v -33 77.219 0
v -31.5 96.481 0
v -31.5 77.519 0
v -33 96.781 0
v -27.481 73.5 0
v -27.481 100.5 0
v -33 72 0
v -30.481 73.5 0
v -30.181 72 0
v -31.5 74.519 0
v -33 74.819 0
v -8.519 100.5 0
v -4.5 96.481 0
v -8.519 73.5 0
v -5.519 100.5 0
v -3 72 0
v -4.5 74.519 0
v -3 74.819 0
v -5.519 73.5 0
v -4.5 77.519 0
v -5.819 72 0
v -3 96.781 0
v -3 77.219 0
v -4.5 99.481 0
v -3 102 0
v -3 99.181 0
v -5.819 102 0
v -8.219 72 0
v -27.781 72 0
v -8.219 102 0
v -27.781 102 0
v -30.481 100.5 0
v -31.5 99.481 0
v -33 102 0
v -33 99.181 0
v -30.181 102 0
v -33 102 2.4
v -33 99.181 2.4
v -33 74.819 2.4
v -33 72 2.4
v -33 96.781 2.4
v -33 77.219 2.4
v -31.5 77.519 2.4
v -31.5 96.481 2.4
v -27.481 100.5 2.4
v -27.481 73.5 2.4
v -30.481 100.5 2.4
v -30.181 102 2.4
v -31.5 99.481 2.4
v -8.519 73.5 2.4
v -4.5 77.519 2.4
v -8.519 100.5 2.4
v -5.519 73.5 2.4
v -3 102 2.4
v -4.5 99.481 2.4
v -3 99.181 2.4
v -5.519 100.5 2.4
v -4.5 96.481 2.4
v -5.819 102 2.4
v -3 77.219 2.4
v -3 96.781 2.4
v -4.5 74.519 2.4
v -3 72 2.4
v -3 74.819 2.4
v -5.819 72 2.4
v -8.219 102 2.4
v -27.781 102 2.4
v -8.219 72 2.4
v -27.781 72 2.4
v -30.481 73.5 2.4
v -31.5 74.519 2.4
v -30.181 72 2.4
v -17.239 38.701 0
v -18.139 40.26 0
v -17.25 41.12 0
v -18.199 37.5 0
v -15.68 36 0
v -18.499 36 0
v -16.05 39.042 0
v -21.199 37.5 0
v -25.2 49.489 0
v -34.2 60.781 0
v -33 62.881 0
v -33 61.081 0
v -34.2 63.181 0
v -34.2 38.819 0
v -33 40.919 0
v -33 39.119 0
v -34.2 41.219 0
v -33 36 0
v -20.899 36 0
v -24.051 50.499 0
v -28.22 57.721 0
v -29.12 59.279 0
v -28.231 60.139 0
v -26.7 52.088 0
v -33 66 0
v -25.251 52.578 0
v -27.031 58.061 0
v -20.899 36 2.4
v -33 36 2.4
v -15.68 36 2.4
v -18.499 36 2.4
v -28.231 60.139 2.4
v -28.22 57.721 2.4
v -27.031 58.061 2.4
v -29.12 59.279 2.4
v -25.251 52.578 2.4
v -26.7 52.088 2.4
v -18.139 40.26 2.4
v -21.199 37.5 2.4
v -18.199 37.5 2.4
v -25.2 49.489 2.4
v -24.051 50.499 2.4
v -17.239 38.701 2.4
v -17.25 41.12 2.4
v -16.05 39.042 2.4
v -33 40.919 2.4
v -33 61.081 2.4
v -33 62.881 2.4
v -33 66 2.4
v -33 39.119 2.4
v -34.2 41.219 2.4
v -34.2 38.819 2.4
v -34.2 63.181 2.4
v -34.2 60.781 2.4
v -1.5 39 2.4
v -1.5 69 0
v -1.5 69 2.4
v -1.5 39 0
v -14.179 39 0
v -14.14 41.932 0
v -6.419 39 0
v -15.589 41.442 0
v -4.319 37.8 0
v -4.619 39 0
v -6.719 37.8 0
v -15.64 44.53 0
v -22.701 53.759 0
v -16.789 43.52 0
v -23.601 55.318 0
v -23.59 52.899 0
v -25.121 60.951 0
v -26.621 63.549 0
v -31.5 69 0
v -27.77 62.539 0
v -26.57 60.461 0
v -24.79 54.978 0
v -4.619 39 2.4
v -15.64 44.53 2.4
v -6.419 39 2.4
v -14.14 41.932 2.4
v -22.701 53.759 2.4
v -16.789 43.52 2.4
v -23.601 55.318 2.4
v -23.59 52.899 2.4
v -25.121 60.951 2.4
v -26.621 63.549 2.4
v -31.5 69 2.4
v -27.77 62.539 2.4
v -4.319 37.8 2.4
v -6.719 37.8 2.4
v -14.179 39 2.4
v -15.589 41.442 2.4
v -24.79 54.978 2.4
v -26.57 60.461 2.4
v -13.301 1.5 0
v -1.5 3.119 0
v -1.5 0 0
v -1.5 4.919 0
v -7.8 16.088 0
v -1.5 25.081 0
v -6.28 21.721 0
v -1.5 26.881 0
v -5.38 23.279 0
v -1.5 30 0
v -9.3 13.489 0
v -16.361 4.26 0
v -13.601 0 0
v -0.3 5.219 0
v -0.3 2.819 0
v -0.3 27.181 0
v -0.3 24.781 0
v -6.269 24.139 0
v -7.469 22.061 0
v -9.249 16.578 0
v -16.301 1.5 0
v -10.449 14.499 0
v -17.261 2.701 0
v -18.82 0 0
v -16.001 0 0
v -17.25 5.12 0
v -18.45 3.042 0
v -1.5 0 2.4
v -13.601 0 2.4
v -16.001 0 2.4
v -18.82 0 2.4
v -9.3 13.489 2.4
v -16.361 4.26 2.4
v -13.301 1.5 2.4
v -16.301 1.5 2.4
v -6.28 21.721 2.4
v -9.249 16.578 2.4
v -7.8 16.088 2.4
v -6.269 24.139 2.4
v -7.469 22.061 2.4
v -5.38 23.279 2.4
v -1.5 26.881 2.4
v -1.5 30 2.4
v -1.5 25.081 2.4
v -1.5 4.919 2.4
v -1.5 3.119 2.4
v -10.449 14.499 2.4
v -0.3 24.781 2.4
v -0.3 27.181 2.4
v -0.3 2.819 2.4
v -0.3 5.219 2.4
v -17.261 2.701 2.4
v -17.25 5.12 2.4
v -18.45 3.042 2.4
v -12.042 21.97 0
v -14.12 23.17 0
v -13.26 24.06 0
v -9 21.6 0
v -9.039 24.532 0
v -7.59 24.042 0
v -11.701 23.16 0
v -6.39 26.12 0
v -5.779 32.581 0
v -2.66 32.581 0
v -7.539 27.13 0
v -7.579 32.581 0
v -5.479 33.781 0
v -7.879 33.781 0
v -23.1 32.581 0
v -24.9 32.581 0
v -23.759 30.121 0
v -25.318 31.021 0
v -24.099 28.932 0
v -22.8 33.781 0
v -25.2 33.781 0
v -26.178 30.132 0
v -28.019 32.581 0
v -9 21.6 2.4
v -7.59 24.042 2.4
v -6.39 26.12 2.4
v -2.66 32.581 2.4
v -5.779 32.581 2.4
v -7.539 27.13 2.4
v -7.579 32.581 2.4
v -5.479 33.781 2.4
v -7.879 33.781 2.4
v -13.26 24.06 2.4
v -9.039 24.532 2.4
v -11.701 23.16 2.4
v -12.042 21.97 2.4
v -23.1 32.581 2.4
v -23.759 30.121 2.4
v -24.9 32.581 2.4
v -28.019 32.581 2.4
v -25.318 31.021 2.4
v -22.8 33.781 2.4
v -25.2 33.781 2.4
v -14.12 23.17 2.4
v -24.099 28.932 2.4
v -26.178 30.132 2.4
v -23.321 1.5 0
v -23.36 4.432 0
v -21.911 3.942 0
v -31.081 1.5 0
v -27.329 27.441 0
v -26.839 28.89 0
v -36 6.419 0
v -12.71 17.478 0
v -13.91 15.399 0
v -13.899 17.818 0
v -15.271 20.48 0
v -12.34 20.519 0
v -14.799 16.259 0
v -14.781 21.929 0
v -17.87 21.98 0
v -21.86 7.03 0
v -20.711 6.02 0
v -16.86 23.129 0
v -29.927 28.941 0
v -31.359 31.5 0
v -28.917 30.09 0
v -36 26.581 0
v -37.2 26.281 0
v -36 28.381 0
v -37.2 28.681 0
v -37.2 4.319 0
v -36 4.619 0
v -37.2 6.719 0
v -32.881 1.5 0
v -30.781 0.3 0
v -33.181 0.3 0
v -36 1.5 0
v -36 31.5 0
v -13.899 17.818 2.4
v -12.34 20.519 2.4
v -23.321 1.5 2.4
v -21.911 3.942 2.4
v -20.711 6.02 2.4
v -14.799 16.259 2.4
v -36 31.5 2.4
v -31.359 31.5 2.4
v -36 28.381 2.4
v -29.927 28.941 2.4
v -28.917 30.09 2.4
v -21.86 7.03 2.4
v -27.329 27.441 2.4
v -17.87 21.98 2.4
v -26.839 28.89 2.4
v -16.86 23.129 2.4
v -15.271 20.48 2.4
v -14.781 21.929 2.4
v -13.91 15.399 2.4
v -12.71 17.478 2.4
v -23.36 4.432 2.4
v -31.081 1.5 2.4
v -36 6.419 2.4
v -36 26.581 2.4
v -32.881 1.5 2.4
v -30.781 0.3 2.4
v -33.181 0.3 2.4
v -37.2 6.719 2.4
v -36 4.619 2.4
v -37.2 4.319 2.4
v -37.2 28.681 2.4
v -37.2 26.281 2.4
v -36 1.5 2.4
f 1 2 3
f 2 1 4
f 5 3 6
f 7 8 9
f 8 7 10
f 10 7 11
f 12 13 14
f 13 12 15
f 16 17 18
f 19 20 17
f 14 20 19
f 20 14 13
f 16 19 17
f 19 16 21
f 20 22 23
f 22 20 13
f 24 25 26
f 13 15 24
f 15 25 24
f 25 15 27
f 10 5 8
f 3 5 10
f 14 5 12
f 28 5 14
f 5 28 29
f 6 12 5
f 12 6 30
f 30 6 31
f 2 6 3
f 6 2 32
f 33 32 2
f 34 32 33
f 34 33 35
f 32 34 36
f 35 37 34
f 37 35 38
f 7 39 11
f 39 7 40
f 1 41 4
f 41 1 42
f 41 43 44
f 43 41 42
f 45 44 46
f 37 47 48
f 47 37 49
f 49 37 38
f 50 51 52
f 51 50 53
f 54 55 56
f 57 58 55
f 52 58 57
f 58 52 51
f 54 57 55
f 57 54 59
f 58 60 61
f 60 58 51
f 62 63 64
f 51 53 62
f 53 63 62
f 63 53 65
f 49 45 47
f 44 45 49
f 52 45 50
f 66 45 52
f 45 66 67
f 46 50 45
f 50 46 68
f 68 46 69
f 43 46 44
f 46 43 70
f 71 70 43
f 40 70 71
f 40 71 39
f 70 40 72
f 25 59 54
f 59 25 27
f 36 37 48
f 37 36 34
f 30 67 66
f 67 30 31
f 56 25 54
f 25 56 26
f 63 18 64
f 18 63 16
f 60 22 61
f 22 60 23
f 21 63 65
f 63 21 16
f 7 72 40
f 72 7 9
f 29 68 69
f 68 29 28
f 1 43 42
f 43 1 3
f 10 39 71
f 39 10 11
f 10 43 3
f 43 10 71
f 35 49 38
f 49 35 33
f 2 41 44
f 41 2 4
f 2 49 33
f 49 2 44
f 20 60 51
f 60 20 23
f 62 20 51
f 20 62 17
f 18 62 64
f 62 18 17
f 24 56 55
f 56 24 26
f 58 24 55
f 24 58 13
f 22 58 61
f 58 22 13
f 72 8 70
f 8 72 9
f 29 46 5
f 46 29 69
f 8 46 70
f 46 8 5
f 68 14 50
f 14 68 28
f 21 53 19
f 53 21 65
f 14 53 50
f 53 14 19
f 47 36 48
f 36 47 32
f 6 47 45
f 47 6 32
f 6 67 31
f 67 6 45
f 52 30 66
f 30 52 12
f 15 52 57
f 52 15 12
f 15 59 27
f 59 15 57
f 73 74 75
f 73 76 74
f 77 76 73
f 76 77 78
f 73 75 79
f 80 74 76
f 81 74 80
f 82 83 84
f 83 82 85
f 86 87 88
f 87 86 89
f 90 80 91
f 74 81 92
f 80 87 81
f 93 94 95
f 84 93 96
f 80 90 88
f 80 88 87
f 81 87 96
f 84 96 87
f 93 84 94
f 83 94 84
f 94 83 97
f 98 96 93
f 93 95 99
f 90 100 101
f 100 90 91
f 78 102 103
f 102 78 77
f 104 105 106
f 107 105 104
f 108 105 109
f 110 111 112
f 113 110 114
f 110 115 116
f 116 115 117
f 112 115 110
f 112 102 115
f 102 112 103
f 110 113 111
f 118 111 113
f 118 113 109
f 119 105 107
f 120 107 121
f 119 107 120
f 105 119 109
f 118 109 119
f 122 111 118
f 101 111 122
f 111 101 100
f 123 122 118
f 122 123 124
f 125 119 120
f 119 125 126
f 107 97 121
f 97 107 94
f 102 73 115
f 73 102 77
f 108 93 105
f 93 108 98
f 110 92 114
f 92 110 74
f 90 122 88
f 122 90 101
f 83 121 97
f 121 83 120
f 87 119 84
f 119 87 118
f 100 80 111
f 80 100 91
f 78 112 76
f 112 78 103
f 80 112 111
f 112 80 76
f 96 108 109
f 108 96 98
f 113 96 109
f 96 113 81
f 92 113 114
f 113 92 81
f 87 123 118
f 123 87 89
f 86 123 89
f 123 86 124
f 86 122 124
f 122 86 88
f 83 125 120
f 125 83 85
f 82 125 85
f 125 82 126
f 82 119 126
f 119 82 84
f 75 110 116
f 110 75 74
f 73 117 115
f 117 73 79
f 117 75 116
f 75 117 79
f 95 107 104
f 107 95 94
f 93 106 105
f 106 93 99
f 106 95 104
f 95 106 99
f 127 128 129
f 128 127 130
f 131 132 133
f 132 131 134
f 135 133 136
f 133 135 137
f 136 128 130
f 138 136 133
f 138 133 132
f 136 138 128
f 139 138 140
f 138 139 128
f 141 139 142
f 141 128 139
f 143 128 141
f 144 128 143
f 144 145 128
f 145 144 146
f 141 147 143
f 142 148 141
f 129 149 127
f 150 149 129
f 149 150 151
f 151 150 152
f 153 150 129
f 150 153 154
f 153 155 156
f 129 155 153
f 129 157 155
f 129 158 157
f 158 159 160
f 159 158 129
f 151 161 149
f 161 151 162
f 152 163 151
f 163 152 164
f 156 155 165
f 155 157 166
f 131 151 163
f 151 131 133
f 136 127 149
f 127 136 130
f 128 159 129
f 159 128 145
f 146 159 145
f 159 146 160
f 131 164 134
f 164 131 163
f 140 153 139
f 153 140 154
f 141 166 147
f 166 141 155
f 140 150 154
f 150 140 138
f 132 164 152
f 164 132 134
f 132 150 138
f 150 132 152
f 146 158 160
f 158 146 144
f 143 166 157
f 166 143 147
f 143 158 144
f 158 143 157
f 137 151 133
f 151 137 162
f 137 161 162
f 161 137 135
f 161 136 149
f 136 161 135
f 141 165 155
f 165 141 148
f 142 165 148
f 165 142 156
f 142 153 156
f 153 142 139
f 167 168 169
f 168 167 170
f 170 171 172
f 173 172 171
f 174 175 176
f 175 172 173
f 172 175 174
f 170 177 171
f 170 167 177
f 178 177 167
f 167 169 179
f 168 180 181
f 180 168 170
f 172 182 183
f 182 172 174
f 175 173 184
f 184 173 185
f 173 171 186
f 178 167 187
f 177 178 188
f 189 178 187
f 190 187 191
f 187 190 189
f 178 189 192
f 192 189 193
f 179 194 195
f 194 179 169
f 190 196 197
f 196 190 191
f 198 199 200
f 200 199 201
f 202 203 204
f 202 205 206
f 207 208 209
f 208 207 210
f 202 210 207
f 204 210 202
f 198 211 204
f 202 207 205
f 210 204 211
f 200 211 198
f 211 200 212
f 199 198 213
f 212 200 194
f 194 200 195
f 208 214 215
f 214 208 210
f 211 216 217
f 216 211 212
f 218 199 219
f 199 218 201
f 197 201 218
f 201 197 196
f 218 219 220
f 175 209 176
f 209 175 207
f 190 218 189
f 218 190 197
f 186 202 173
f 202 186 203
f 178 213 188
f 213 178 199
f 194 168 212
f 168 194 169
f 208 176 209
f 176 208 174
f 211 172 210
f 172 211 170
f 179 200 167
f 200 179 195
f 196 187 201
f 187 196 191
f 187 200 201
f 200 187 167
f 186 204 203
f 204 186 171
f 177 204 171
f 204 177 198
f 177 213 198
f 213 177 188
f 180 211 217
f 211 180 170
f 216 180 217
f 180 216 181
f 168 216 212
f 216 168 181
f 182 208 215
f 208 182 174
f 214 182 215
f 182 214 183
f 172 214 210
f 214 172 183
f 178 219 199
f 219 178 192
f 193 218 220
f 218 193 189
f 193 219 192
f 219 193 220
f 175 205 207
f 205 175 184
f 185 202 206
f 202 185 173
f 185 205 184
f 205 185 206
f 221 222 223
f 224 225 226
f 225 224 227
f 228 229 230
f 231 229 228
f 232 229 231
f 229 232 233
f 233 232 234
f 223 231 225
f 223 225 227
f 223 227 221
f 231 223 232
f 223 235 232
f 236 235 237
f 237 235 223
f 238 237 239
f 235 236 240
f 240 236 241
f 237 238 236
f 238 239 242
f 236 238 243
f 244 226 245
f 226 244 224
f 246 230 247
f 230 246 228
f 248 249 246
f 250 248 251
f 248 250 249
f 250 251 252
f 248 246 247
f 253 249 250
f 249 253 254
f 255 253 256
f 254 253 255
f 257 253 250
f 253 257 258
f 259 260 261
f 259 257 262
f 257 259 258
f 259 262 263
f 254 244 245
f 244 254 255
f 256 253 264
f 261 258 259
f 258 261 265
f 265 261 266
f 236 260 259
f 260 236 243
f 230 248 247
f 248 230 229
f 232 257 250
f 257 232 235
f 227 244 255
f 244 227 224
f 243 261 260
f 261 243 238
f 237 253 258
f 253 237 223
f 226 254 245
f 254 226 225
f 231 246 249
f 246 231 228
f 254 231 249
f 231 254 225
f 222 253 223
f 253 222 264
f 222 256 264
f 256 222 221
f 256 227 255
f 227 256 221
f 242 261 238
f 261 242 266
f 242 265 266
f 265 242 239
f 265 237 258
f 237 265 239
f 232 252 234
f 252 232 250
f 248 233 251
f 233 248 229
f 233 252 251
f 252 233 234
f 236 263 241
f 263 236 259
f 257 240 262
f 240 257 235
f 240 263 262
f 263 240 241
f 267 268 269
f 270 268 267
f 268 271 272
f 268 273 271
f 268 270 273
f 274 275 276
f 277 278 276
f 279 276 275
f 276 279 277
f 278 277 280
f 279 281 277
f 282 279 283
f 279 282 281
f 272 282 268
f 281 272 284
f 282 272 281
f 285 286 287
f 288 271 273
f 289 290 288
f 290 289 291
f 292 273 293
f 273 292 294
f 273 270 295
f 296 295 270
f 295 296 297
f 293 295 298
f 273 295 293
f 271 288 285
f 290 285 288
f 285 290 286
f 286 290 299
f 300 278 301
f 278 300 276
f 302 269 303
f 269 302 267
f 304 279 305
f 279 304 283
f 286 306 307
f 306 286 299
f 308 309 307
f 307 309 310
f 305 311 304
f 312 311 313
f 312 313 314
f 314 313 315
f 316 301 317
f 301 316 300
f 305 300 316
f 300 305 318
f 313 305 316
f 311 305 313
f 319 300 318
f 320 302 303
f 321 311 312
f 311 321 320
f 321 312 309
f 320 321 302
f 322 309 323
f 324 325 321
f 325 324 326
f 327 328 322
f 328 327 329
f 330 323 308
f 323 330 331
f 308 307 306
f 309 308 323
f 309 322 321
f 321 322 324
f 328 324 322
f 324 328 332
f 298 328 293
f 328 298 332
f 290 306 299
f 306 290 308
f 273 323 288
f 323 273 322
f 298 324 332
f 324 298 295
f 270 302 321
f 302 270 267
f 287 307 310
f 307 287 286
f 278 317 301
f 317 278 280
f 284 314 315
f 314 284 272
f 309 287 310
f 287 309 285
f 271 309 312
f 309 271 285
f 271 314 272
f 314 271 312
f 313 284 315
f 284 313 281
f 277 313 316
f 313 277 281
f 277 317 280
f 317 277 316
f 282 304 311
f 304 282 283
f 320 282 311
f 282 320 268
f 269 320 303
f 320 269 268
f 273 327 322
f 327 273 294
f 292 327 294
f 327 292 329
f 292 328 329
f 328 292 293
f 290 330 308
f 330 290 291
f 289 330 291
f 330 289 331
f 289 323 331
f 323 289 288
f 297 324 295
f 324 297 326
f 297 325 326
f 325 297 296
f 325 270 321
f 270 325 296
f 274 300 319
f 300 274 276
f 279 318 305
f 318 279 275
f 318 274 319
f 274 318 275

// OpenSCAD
// This code is from https://www.thingiverse.com/thing:6026672
// https://openscad.org/documentation.html#language-reference
// Puzzle Design: John Featherly
// OpenSCAD code: Shawn Featherly 20230718

// width of the unit square in mm
size_of_unit = 30;

// height of all pieces in mm
height_of_pieces = 2.4;

// mm size the 3D slicer will be set at for its print layers. This value is used for spacing between pieces that are meant to slide into one another.
layer_print_size = .3;

/* [Hidden] */
// Remaining variables are hidden from Thingiverse

// thickness of the case
case_size = height_of_pieces;

// shorthand for the size_of_unit variable
unt = size_of_unit;

// shorthand literal for square root of 3
rt3 = sqrt(3);

// how far from the edge most connection pegs will be placed. simplified ((2-(2/SQRT(3))) - 1/SQRT(3))/2
peg_offset = (2*unt-unt*rt3)/2;

// faces on a cylinder https://www.openscad.info/index.php/2020/05/14/cylinder/
$fn=8;

// size all polygons
polygon2 = [[0,0],[0,unt],[unt/rt3,0]];
polygon3 = [[0,0],[0,unt],[unt-unt/rt3,unt],[unt,0]];
polygon5 = [[0,0],[0,unt*rt3 - unt],[unt - unt/rt3,0]];
polygon6 = [[0,0],[0,unt],[2*unt/rt3 - unt,unt],[(unt + unt/rt3)/2,(3*unt - unt*rt3)/2],[unt - unt/rt3,0]];

// distance from acute angle of polygon3 to center of peg to be recieved by polygon1(unit square)
poly3hypotnuseMale = peg_offset + (unt - unt/rt3);

// largest width of polygon6
poly6width = ((unt + unt/rt3)/2);

// builds a set of points (pts) as a polygon and rotates them around pivot unt/2
module build(pts, rotation) {
translate([.5 * unt, .5 * unt, 0]) // remove from pivot
    rotate([0,0,rotation])
        translate([-.5 * unt, -.5 * unt, 0]) // move to pivot
            linear_extrude(height = height_of_pieces) polygon(points=pts);
}

// a dovetail. tail is width deepest in. neck is opening width along edge.
module dove(tail, neck) {
    dove = [[tail,tail],[tail,-tail],[0,-neck],[-tail,-tail],[-tail,tail],[0,neck]];
    linear_extrude(height = 2*tail, center = true) polygon(points = dove);
}

module pegMale(x, y, rotation) {
    translate([x, y, height_of_pieces/2])
        rotate([0,0,rotation])
            dove(height_of_pieces/2, 3*(height_of_pieces/2)/4);
//          cube([height_of_pieces,height_of_pieces,height_of_pieces], center = true);
}

module pegFemale(x, y, rotation) {
    translate([x, y, height_of_pieces/2])
        rotate([0,0,rotation])
            dove(height_of_pieces/2 + layer_print_size, 3*(height_of_pieces/2)/4 + layer_print_size);
//          cube([height_of_pieces + 2*layer_print_size,height_of_pieces,height_of_pieces + 2*layer_print_size], center = true);
}

module polygon2n4() {
    union() {
        difference() {
            build(polygon2, 0);
    
            pegFemale(unt/rt3-peg_offset,0,90);
            pegFemale(poly3hypotnuseMale*cos(60),unt-(poly3hypotnuseMale*sin(60)),30);
        }

        pegMale(0,peg_offset,0);
        pegMale(0,unt-peg_offset,0);
        // SOH CAH TOA https://youtu.be/l5VbdqRjTXc
        pegMale((unt/rt3)-(peg_offset*cos(60)),peg_offset*sin(60),30);
        pegMale((unt/rt3)-((unt-peg_offset)*cos(60)),((unt-peg_offset)*sin(60)),30);
    }
}

// unit square build & move
translate([-1.1 * unt, 2.4 * unt, 0])
    difference() {
        linear_extrude(height = height_of_pieces)
            square(size_of_unit);
        
        // symetrically place peg females all around unit square
        pegFemale(0,peg_offset,0);
        pegFemale(0,unt-peg_offset,0);
        pegFemale(unt,peg_offset,0);
        pegFemale(unt,unt-peg_offset,0);
        pegFemale(peg_offset,0,90);
        pegFemale(unt-peg_offset,0,90);
        pegFemale(peg_offset,unt,90);
        pegFemale(unt-peg_offset,unt,90);
    }
    
// polygon2 build & move
translate([-1.1 * unt, 1.2 * unt, 0])
    polygon2n4();
    
// polygon3 build & move
translate([-1.05 * unt, 1.3 * unt, 0])
    union() {
        difference() {
            build(polygon3, 180);
    
            pegFemale((unt/rt3)-(peg_offset*cos(60)),peg_offset*sin(60),30);
            pegFemale((unt/rt3)-((unt-peg_offset)*cos(60)),((unt-peg_offset)*sin(60)),30);
        }

        pegMale(unt-peg_offset,0,90);
        // SOH CAH TOA
        pegMale(poly3hypotnuseMale*cos(60),unt-(poly3hypotnuseMale*sin(60)),30);
    }

// polygon4 is the same as polygon2
translate([-.05 * unt, 0, 0])
    mirror([1,0,0])
        polygon2n4();

// polygon5 build & (guesstimate) move
translate([-.3 * unt, .72 * unt, 0])
    rotate([0,0,60])
        union() {
            difference() {
                build(polygon5, 0);
    
                pegFemale((unt - unt/rt3)-(2*unt/rt3-(unt-peg_offset)),0,90);
            }
            pegMale(0,peg_offset,0);
            pegMale(0,(unt*rt3 - unt) - peg_offset,0);
            pegMale((unt - unt/rt3)-(peg_offset*cos(60)),peg_offset*sin(60),30);
            pegMale(peg_offset*cos(60),(unt*rt3 - unt)-(peg_offset*sin(60)),30);
        }

// polygon6 build & move
translate([-1.2 * unt, .05 * unt, 0])
    union() {
        difference() {
            build(polygon6, 0);
            
            // 2 females to mate polygon5
            pegFemale((2*unt/rt3 - unt)+(peg_offset*sin(60)),unt-(peg_offset*cos(60)),60);
            pegFemale(poly6width-(peg_offset*sin(60)),(3*unt - unt*rt3)/2+(peg_offset*cos(60)),60);
            
            // 1 female to mate polygon2or4
            pegFemale((unt - unt/rt3)+(peg_offset*cos(60)),peg_offset*sin(60),-30);
        }
        
        // pegs going into polygon1 (unit square)
        pegMale(0,peg_offset,0);
        pegMale(0,unt-peg_offset,0);
        pegMale(0,unt-peg_offset,0);
        
        // peg going into polygon3
        pegMale((unt - unt/rt3)-(2*unt/rt3-(unt-peg_offset)),0,90);
        
        // 1 male to mate polygon2or4
        pegMale(unt-poly3hypotnuseMale*cos(60),unt-(poly3hypotnuseMale*sin(60)),-30);
    }

// Dead code to Test: length of poly2&4 slim corner
//translate([0,30,0])
//    rotate([90,0,30])
//        cylinder(h=2*unt/rt3-(unt-peg_offset),r=1); // length of poly2&4 slim corner
//        cylinder(h=poly3hypotnuseMale,r=2); // length of the hypotnuse along polygon3's male so that it can be recieved by polygon1(unit square)
    
